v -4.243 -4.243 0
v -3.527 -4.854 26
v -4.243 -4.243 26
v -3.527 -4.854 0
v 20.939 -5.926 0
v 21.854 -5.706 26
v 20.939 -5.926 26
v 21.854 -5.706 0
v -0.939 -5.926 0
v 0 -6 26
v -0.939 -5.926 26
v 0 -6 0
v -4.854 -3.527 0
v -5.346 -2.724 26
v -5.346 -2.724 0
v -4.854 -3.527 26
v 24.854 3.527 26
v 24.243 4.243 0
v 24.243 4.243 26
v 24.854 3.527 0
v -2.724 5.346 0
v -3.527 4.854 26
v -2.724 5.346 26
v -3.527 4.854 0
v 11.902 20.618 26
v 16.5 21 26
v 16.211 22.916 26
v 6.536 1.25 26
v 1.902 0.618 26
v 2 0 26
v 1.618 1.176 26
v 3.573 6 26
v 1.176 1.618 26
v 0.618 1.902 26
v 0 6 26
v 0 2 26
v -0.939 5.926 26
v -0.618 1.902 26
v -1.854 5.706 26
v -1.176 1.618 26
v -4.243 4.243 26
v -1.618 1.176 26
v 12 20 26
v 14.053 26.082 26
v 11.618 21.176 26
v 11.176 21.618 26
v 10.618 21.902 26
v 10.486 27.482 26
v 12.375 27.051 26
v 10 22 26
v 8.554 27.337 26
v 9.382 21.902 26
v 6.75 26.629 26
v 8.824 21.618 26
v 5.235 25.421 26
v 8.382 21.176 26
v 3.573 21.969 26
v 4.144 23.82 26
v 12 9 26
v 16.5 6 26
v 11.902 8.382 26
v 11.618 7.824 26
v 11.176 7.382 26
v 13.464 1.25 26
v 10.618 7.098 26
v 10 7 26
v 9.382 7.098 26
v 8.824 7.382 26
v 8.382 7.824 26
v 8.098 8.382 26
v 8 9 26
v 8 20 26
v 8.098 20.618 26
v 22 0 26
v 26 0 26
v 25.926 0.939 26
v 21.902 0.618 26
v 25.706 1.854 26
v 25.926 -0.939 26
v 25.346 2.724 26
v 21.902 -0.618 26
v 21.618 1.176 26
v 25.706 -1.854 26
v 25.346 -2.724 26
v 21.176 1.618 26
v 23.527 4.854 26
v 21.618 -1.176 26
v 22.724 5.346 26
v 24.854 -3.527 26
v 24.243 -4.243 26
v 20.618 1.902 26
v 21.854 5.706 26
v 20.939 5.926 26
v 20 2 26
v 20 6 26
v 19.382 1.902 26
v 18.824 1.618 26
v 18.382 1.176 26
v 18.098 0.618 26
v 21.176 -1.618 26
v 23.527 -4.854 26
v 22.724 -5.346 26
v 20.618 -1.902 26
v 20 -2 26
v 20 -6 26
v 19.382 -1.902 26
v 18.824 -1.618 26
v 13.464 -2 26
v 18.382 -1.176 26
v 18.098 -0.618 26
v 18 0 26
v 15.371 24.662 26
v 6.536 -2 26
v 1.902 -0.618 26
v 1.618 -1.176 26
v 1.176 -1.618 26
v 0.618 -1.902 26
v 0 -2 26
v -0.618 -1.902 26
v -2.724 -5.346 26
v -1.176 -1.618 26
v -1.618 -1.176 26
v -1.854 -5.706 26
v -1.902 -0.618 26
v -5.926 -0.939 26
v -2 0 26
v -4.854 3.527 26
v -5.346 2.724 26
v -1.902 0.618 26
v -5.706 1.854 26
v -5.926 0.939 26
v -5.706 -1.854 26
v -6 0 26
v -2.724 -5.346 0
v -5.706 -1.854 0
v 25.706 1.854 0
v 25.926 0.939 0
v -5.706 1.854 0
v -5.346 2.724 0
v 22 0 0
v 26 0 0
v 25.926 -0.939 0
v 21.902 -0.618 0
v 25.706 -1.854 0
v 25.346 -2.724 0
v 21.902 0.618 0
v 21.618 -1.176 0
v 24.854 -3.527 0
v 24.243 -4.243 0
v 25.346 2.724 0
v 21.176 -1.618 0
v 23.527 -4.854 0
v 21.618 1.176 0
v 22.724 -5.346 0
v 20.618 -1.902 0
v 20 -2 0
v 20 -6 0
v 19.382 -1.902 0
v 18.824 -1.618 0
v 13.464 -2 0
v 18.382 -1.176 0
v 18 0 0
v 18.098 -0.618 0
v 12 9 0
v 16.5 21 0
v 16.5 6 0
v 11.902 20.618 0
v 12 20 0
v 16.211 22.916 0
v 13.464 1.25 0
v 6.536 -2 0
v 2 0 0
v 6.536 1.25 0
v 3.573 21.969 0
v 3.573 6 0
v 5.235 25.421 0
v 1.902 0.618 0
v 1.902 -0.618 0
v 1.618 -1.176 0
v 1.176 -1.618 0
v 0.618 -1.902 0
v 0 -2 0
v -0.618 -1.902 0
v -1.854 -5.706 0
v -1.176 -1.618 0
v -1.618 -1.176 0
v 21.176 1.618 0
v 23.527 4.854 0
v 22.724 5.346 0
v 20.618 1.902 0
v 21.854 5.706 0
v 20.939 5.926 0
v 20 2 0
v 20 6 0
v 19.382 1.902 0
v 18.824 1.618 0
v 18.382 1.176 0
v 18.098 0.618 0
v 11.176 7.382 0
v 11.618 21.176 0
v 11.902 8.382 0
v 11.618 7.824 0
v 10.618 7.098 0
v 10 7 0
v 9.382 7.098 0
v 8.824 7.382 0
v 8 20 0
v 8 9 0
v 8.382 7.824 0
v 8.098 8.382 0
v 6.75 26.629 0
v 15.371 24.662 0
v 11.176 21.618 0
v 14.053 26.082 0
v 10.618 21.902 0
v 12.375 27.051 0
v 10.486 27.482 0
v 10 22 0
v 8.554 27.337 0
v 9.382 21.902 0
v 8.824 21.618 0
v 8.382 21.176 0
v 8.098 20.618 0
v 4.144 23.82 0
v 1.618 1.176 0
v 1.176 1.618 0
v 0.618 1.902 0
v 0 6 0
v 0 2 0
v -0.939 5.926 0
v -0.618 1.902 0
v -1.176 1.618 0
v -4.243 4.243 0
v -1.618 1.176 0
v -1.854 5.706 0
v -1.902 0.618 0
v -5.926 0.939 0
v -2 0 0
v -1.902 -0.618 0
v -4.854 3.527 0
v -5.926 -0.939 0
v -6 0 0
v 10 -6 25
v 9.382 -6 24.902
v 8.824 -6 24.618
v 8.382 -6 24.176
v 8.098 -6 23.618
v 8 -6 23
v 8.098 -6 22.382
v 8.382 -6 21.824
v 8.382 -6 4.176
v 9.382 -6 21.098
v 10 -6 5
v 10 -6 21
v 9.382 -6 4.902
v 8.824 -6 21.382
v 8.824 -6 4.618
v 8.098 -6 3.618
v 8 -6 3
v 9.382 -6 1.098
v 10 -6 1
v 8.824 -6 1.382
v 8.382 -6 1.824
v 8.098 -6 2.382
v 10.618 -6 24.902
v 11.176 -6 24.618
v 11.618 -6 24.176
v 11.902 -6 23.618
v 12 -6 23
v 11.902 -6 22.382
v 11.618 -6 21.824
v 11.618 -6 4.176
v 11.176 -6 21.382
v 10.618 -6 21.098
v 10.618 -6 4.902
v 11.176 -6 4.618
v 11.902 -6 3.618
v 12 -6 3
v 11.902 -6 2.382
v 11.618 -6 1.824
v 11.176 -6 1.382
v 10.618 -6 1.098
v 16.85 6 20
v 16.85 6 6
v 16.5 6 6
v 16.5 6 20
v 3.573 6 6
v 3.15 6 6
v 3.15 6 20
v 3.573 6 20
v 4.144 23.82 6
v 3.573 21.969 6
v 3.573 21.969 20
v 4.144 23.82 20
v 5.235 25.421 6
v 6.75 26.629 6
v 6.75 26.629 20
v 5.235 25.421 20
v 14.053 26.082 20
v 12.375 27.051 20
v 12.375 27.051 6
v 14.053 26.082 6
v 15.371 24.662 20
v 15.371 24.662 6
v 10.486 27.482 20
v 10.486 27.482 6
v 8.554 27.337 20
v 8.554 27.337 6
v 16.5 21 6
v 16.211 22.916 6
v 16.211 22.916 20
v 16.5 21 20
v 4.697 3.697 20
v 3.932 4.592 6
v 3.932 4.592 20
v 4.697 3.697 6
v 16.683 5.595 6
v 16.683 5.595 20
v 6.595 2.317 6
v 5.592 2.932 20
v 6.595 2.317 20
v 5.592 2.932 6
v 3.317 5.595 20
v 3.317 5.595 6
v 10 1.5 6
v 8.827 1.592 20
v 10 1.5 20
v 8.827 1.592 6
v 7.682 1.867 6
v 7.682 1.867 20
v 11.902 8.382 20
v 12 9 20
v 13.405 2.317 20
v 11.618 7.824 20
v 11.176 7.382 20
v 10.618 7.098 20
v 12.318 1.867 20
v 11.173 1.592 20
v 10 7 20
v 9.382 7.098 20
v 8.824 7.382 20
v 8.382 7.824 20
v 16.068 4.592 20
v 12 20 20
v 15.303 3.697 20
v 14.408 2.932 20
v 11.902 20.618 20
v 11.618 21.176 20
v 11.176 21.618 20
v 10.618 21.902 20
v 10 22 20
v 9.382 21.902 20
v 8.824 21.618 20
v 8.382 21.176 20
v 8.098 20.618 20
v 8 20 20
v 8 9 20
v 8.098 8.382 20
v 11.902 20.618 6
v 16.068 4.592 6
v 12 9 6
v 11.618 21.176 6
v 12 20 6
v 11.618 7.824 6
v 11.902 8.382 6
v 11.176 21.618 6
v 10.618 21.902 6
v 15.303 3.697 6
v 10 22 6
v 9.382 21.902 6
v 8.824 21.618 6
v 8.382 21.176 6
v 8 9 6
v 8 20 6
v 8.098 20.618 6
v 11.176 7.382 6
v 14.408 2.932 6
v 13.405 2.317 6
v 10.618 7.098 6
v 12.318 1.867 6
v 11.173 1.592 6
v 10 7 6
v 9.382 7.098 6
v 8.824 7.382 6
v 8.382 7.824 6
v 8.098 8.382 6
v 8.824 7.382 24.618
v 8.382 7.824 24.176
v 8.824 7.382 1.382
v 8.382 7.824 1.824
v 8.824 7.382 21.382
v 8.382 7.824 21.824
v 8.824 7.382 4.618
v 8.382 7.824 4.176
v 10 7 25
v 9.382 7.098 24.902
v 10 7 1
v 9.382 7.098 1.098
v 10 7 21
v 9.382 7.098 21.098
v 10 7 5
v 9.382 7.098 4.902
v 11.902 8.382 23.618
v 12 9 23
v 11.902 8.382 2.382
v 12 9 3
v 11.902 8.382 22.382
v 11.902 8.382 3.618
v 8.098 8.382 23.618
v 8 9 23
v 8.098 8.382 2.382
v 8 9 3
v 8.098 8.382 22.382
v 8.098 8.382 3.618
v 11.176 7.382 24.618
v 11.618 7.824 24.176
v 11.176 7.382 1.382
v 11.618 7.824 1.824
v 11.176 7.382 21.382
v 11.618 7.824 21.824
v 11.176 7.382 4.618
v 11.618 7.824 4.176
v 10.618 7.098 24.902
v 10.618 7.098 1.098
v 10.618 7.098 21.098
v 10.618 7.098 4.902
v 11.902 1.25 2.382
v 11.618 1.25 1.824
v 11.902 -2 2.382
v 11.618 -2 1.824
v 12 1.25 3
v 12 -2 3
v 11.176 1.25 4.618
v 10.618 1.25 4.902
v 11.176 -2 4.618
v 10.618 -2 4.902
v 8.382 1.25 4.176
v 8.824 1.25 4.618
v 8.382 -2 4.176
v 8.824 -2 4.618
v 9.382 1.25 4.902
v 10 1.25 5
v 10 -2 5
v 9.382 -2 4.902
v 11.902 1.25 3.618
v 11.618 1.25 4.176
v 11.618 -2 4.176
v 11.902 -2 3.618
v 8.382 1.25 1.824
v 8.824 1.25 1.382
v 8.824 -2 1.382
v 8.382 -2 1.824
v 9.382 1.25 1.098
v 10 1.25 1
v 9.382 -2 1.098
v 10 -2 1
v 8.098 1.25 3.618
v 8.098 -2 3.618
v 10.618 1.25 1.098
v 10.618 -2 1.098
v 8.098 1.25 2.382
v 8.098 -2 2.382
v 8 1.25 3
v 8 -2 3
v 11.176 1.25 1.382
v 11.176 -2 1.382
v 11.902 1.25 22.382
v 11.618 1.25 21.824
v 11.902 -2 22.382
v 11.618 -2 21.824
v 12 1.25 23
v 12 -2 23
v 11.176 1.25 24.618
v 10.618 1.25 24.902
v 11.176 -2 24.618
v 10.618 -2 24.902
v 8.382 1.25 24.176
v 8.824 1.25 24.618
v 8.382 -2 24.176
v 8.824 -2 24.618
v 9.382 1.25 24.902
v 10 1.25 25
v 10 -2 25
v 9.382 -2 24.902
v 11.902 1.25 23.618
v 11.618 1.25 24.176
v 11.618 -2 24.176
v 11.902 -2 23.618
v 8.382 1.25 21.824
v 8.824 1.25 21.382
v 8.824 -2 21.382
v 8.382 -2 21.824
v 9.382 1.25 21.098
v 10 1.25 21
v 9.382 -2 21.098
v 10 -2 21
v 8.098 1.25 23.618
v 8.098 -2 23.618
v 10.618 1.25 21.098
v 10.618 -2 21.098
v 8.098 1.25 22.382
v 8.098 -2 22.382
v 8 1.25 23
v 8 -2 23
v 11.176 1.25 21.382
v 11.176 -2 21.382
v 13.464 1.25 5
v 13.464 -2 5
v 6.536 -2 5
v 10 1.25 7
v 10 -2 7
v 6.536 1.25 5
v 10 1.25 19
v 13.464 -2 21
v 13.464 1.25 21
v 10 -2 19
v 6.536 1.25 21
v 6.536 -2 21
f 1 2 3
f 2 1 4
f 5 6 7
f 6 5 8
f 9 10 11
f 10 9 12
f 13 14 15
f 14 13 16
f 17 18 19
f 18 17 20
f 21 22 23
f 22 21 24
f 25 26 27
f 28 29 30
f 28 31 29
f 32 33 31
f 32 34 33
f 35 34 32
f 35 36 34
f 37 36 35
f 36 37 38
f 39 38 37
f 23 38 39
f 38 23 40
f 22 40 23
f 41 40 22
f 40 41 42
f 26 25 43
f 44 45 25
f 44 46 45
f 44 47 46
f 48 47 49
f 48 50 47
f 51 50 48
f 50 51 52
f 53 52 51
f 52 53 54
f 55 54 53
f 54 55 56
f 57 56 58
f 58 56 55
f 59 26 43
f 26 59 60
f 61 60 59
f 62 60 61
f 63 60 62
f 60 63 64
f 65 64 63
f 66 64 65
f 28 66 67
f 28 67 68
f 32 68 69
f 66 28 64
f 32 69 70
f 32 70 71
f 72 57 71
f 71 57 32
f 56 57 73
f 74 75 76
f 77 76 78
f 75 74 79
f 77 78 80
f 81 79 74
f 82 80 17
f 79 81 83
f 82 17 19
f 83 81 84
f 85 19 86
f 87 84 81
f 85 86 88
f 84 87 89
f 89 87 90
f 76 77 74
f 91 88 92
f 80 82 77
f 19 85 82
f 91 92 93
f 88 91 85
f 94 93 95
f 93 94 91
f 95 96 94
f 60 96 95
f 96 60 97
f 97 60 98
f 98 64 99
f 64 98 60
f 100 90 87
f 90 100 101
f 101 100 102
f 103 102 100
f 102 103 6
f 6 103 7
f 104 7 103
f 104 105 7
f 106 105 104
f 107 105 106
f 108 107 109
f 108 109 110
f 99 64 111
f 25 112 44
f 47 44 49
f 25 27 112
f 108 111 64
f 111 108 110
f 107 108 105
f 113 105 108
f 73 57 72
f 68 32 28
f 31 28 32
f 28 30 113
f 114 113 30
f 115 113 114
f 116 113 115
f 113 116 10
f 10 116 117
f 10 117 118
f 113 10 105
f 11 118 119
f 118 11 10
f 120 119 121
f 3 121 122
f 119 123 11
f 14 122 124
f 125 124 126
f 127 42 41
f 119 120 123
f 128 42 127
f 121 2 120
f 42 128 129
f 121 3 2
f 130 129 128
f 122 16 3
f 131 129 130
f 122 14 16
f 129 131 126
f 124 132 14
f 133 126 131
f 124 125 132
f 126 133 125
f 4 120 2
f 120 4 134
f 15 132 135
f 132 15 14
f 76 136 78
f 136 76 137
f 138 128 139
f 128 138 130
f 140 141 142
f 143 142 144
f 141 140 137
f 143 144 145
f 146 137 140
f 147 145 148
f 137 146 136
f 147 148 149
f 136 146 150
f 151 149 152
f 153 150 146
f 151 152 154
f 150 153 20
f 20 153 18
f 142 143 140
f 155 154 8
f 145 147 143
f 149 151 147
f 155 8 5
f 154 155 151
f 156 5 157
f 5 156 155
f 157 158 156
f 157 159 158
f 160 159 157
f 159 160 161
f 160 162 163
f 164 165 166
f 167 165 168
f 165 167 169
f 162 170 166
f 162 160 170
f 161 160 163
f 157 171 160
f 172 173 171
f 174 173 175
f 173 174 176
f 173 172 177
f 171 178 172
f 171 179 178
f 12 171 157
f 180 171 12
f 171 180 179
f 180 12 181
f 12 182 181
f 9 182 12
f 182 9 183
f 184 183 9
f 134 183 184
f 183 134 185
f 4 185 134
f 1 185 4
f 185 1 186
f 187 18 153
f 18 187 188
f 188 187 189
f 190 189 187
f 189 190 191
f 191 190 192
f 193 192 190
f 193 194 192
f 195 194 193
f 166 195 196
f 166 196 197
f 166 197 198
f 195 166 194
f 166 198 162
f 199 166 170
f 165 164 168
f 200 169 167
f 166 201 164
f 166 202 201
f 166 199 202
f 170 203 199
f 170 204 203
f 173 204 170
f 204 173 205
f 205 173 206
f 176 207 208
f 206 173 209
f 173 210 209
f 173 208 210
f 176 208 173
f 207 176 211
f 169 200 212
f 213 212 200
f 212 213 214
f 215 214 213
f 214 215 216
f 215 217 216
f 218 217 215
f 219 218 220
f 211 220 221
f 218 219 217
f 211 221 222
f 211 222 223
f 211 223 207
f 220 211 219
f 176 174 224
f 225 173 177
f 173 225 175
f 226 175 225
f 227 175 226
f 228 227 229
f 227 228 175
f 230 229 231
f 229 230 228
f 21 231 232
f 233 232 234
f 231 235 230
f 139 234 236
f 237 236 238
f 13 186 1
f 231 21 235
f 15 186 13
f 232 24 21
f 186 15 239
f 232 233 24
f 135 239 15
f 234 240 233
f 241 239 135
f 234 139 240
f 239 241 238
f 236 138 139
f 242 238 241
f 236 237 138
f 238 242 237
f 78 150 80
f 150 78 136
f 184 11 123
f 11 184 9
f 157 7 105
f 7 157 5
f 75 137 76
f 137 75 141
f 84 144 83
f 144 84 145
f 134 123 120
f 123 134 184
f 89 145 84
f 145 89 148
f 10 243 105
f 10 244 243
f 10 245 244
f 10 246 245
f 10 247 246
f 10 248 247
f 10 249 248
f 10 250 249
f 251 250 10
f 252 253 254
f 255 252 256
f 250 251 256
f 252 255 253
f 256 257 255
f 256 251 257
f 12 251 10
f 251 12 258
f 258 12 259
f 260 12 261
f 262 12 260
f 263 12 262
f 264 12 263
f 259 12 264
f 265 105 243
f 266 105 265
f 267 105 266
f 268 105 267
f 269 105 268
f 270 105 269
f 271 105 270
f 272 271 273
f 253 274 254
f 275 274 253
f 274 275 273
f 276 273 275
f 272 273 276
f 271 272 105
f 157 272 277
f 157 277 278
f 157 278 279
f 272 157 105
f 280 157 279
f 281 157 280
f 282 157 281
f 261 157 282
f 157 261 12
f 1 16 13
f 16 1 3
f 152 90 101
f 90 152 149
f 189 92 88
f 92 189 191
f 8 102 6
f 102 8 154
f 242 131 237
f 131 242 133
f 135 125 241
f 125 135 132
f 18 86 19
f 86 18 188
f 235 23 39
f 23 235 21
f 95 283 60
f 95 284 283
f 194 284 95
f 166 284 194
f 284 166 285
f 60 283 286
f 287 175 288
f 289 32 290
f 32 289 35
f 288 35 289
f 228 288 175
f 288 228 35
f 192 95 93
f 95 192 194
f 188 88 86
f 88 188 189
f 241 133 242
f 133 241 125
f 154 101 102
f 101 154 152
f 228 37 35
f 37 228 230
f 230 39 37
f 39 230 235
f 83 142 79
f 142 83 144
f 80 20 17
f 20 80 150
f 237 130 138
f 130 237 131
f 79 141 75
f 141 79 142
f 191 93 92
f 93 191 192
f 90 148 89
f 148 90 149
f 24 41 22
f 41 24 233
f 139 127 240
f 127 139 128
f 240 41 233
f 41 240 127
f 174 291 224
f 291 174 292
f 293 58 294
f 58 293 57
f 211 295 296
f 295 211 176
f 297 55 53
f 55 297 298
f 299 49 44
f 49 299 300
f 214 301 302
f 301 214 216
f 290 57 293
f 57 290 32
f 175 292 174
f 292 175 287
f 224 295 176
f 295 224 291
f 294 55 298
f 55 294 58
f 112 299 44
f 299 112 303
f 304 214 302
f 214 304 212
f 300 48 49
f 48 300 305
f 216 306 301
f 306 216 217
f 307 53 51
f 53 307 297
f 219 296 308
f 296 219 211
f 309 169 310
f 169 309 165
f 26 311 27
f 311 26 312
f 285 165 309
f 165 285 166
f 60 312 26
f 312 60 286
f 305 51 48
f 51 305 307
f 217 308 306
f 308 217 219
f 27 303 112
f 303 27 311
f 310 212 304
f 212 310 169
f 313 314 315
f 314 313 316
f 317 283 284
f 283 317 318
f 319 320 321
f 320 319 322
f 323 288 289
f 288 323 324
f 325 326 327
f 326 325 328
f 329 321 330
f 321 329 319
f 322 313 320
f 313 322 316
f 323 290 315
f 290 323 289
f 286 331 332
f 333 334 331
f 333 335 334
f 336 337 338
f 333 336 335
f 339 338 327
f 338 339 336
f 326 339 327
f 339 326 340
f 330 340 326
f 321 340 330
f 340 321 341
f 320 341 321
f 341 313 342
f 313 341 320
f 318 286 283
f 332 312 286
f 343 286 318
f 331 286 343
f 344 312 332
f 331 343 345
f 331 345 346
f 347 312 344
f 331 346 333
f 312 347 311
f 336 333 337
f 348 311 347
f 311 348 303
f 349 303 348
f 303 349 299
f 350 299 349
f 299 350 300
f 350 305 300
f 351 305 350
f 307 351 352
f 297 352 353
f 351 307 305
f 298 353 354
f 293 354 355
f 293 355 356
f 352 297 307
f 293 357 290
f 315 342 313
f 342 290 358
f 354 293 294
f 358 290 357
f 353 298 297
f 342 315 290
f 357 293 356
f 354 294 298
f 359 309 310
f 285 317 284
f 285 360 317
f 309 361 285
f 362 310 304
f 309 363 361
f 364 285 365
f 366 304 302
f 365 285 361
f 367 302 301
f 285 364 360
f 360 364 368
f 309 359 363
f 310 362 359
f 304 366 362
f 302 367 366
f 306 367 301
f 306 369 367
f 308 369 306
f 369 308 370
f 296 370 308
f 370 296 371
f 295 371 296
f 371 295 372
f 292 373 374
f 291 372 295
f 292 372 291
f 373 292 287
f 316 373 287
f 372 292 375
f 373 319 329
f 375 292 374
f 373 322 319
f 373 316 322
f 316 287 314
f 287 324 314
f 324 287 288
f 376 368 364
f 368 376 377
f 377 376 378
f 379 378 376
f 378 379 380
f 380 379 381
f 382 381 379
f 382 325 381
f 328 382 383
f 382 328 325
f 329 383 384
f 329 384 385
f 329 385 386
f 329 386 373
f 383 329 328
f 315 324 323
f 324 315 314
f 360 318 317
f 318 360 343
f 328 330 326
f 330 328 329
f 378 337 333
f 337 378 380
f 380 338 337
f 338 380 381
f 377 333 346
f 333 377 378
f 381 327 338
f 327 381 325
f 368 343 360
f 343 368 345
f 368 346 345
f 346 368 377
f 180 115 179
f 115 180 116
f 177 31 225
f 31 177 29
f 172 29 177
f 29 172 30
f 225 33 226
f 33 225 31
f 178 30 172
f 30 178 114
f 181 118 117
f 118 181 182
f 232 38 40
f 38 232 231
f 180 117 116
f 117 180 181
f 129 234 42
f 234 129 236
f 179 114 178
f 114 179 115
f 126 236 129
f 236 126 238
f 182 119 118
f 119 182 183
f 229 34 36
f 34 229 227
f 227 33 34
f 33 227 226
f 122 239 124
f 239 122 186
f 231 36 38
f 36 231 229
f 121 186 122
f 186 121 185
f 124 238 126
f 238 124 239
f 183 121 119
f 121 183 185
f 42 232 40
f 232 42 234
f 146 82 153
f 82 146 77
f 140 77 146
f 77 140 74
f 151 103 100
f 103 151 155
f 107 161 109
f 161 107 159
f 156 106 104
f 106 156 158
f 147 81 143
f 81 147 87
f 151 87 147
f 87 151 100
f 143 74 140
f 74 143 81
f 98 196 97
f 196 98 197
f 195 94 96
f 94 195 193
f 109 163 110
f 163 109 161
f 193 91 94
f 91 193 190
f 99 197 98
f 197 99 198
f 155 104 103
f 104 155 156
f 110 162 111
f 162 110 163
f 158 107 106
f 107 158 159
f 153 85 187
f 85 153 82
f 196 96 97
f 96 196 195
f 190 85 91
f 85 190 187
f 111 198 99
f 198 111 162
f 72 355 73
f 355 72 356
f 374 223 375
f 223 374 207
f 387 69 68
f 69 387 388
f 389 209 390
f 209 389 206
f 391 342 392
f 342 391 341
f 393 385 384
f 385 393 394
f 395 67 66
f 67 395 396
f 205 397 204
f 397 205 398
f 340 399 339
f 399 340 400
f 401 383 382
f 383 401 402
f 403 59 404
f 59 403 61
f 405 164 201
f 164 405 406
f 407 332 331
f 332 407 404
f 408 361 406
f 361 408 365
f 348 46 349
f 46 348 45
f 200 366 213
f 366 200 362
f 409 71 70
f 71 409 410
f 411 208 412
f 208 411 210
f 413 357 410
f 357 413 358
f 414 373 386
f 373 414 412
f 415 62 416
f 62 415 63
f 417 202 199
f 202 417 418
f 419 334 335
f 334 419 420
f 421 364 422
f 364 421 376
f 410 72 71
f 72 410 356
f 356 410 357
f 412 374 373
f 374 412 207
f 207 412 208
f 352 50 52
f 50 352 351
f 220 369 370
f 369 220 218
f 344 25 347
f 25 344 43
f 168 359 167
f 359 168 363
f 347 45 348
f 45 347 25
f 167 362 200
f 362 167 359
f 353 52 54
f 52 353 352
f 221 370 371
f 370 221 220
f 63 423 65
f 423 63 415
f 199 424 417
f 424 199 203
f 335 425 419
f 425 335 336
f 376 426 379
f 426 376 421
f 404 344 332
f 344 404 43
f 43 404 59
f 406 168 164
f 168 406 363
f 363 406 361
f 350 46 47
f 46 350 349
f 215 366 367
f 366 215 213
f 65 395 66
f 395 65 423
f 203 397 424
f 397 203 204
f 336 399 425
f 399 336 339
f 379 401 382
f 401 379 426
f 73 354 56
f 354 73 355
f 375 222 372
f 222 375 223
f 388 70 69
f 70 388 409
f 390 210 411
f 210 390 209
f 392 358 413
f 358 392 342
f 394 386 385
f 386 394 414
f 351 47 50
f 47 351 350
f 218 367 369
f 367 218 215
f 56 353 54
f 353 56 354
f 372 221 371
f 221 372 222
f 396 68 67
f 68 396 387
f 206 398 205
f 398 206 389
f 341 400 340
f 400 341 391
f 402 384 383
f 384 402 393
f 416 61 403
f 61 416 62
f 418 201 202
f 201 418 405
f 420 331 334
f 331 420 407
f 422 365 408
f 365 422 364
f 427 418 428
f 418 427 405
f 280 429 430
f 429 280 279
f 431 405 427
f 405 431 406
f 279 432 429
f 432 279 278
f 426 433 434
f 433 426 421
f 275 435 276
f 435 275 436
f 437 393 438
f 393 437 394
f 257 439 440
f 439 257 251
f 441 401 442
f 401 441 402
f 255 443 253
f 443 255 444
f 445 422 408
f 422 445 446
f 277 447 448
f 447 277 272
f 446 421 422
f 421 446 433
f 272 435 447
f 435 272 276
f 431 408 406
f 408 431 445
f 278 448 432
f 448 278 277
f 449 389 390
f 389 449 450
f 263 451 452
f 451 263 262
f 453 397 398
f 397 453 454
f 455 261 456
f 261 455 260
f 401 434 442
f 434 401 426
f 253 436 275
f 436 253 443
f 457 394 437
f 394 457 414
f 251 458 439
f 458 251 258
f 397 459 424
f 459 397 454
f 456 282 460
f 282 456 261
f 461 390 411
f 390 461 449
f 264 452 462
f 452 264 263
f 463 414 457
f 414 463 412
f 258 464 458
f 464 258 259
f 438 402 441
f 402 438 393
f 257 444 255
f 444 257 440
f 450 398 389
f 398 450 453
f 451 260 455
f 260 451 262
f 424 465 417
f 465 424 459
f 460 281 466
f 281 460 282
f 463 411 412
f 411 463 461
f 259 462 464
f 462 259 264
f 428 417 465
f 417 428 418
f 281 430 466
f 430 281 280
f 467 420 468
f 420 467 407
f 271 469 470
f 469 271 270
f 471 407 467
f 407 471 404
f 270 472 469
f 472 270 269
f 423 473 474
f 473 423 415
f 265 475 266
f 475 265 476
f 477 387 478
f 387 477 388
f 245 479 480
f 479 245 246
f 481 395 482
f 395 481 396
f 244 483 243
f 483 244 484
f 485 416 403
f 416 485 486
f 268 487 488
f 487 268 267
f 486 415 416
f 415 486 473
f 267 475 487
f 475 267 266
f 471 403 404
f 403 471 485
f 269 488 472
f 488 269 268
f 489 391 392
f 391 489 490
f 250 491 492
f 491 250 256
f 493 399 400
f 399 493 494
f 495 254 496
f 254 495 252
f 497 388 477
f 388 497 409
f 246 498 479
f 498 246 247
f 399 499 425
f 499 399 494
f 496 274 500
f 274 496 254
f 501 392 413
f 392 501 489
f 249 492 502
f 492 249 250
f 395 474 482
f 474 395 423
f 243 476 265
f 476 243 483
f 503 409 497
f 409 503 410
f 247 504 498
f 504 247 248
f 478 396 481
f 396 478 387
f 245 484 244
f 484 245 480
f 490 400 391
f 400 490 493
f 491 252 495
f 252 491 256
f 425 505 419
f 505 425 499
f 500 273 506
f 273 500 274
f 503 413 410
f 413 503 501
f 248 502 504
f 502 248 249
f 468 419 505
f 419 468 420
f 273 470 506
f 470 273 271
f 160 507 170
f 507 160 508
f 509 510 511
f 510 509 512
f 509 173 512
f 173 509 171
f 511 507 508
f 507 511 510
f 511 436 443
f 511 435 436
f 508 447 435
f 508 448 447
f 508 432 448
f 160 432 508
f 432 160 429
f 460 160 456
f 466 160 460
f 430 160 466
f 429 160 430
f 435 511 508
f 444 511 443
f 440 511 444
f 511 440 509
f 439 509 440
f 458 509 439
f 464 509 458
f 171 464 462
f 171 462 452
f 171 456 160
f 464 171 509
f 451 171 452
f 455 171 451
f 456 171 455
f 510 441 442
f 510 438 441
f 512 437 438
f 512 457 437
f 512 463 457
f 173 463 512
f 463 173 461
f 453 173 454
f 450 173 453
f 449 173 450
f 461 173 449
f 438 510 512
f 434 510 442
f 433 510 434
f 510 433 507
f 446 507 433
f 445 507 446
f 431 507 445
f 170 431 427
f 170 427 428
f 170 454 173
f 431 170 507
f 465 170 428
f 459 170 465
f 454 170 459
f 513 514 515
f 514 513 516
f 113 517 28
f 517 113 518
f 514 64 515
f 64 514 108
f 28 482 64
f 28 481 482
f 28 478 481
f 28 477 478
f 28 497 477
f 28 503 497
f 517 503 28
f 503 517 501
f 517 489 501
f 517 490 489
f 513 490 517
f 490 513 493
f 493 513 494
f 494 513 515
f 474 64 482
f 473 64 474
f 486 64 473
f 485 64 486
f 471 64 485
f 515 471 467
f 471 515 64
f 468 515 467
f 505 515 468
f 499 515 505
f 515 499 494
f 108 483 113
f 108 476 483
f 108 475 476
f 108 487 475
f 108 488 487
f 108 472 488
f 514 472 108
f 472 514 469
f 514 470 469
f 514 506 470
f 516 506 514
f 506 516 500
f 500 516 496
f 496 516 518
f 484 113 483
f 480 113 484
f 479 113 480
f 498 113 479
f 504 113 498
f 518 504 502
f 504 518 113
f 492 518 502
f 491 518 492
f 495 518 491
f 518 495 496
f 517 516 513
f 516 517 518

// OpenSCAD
// file: utils.scad
// Author: Mihai Oltean, www.tcreate.org, mihai.oltean@gmail.com
// More details: jenny5.org
// Source: github.com/jenny5-robot
// MIT License
//--------------------------------------------------------------

module colt(radius, height)
{
	difference(){
		cube ([radius, radius, height]);
		cylinder	(h = height, r = radius, $fn = 30);
	}
}
/////////////////////////////////////////////////////////////////////////////////////////////////////////////////////////
module colt_sferic(radius)
{
	difference(){
		cube ([radius, radius, radius]);
		sphere(r = radius, $fn = 40);
	}
}
/////////////////////////////////////////////////////////////////////////////////////////////////////////////////////////
module coloana_sferica(height, radius)
{
		difference(){
			cube ([height, height, height]);
			cylinder(h= height, r = radius, $fn = 50);
		}
}
/////////////////////////////////////////////////////////////////////////////////////////////////////////////////////////
// file: radial_bearings.scad
// Author: Mihai Oltean, www.tcreate.org, mihai.oltean@gmail.com
// More details: jenny5.org
// Source: github.com/jenny5-robot
// MIT License
//--------------------------------------------------------------

include <params_radial_bearings.scad>
use <basic_components.scad>

////////////////////////////////////////////////////////////////////////////////////////////////////////////////////////
module radial_bearing(internal_radius, external_radius, height)
{
	union(){
		translate ([0, 0, 0.5]) color ("black") cylinder_empty(height  - 1, external_radius - 1, internal_radius + 1, 70);
		color ("Gainsboro") cylinder_empty(height, internal_radius + 1, internal_radius, 70);
		color ("Gainsboro") cylinder_empty(height, external_radius, external_radius - 1, 70);
	}
}
////////////////////////////////////////////////////////////////////////////////////////////////////////////////////////
module 624rs()
{
	radial_bearing(2, bearing_4_external_radius, bearing_4_height);
}
////////////////////////////////////////////////////////////////////////////////////////////////////////////////////////
module 628rs()
{
	radial_bearing(4, bearing_8_external_radius, bearing_8_height);
}
////////////////////////////////////////////////////////////////////////////////////////////////////////////////////////
module 625rs()
{
	radial_bearing(2.5, bearing_5_external_radius, bearing_5_height);
}
////////////////////////////////////////////////////////////////////////////////////////////////////////////////////////
module 626rs()
{
	radial_bearing(3, bearing_6_external_radius, bearing_6_height);
}
////////////////////////////////////////////////////////////////////////////////////////////////////////////////////////
module 6001rs()
{
	radial_bearing(rb_6001_internal_radius, rb_6001_external_radius, rb_6001_thick);
}
////////////////////////////////////////////////////////////////////////////////////////////////////////////////////////
module 6002rs()
{
	radial_bearing(rb_6002_internal_radius, rb_6002_external_radius, rb_6002_thick);
}
////////////////////////////////////////////////////////////////////////////////////////////////////////////////////////
module 608rs()
{
	radial_bearing(rb_608_internal_radius, rb_608_external_radius, rb_608_thick);
}
////////////////////////////////////////////////////////////////////////////////////////////////////////////////////////
module 698rs()
{
	radial_bearing(rb_698_internal_radius, rb_698_external_radius, rb_698_thick);
}
////////////////////////////////////////////////////////////////////////////////////////////////////////////////////////
6002rs();
// file: config.scad
// Author: Mihai Oltean, www.tcreate.org, mihai.oltean@gmail.com
// More details: jenny5.org
// Source: github.com/jenny5-robot
// MIT License
//--------------------------------------------------------------

aluminium_color = "Silver";
screw_color = "LightSlateGray";
frame_color = aluminium_color;
shaft_color = "Silver";
plastic_color = "LimeGreen";
pulley_color = "DarkSlateGray";
// file: params_radial_bearings.scad
// Author: Mihai Oltean, www.tcreate.org, mihai.oltean@gmail.com
// More details: jenny5.org
// Source: github.com/jenny5-robot
// MIT License
//--------------------------------------------------------------

bearing_4_external_radius = 6.5;
bearing_4_height = 5;

bearing_5_external_radius = 8;
bearing_5_internal_radius = 2.5;
bearing_5_thick = 5;
bearing_5_height = 5;

bearing_6_internal_radius = 3;
bearing_6_external_radius = 9.5;
bearing_6_thick = 6;
bearing_6_height = 6;

bearing_8_internal_radius = 4;
bearing_8_external_radius = 11;
bearing_8_height = 7;

bearing_10_internal_radius = 5;
bearing_10_external_radius = 13;
bearing_10_height = 8;

radial_bearing_4_external_radius = 6.5;
radial_bearing_4_height = 5;

radial_bearing_5_external_radius = 8;
radial_bearing_5_internal_radius = 2.5;
radial_bearing_5_thick = 5;
radial_bearing_5_height = 5;

radial_bearing_6_internal_radius = 3;
radial_bearing_6_external_radius = 9.5;
radial_bearing_6_thick = 6;
radial_bearing_6_height = 6;

radial_bearing_8_internal_radius = 4;
radial_bearing_8_external_radius = 11;
radial_bearing_8_height = 7;

radial_bearing_10_internal_radius = 5;
radial_bearing_10_external_radius = 13;
radial_bearing_10_height = 8;

rb_6002_internal_radius = 7.5;
rb_6002_external_radius = 16;
rb_6002_thick = 9;

rb_624_internal_radius = 2;
rb_624_external_radius = 6.5;
rb_624_thick = 5;

rb_625_internal_radius = 2.5;
rb_625_external_radius = 8;
rb_625_thick = 5;

rb_626_internal_radius = 3;
rb_626_external_radius = 9.5;
rb_626_thick = 6;

rb_608_internal_radius = 4;
rb_608_external_radius = 11;
rb_608_thick = 7;

rb_698_internal_radius = 4;
rb_698_external_radius = 9.5;
rb_698_thick = 6;

rb_688_internal_radius = 4;
rb_688_external_radius = 8;
rb_688_thick = 4;

rb_6001_internal_radius = 6;
rb_6001_external_radius = 14;
rb_6001_thick = 8;

rb_6201_internal_radius = 6;
rb_6201_external_radius = 16;
rb_6201_thick = 10;
// file: params_basic_components.scad
// Author: Mihai Oltean, www.tcreate.org, mihai.oltean@gmail.com
// More details: jenny5.org
// Source: github.com/jenny5-robot
// MIT License
//--------------------------------------------------------------

spring_length = 20;

smooth_rod_8_radius = 4;
smooth_rod_10_radius = 5;
smooth_rod_12_radius = 6;

tolerance = 0.1;
display_tolerance = 1;

overlap_tolerance = 0.01;

wall_thick_1 = 1;
wall_thick_2 = 2;
wall_thick_3 = 3;
wall_thick_4 = 4;
wall_thick_5 = 5;
wall_thick_5_5 = 5.5;
wall_thick_6 = 6;
wall_thick_7 = 7;
wall_thick_8 = 8;
wall_thick_9 = 9;
wall_thick_10 = 10;
wall_thick_12 = 10;

tolerance_z = [0, 0, tolerance];
tolerance_x = [tolerance, 0, 0];
tolerance_y = [0, tolerance, 0];

display_tolerance_z = [0, 0, display_tolerance];
display_tolerance_x = [display_tolerance, 0, 0];
display_tolerance_y = [0, display_tolerance, 0];

display_tolerance_xz = [display_tolerance, 0, display_tolerance];
display_tolerance_xy = [display_tolerance, display_tolerance, 0];
display_tolerance_yz = [0, display_tolerance, display_tolerance];

display_tolerance_xyz = [display_tolerance, display_tolerance, display_tolerance];
// file: params_screws_nuts_washers.scad
// Author: Mihai Oltean, www.tcreate.org, mihai.oltean@gmail.com
// More details: jenny5.org
// Source: github.com/jenny5-robot
// MIT License
//--------------------------------------------------------------


m2_screw_radius = 1;
m2_nut_radius = 2.2;
m2_nut_height = 1.6;
m2_nut_thick = m2_nut_height;

m3_screw_radius = 1.5;
m3_nut_radius = 3.1;
m3_nut_height = 2.3;
m3_nut_thick = m3_nut_height;
m3_autolock_nut_thick = 4.2;

m4_screw_radius = 2;
m4_nut_radius = 4;
m4_auto_lock_nut_height = 5;
m4_nut_height = 3.25;
m4_nut_thick = 3.25;

m5_screw_radius = 2.5;
m5_nut_radius = 4.6;
m5_nut_height = 4;

m6_screw_radius = 3;
m6_nut_radius = 5.65;
m6_nut_thick = 5;
m6_nut_slim_thick = 3;
m6_autolock_nut_thick = 6;
m6_long_nut_thick = 9;

m8_screw_head_height = 5.7;
m8_screw_radius = 3.9;
m8_nut_small_width = 12.8;
m8_nut_radius = 7.3;
m8_slim_nut_small_width = 12.4;
m8_nut_thick = 6.5;
m8_nut_height = m8_nut_thick;
m8_slim_nut_height = 5.5;
m8_screw_head_radius = 6.5;
m8_autolock_nut_thick = 8;

m10_screw_radius = 5;
m10_nut_thick = 8;
m10_nut_radius = 9.8;

M12_screw_radius = 6;
M12_nut_thick = 8;
M12_nut_radius = 11;
M12_long_long_nut_thick = 36;
M12_long_nut_thick = 36;
M12_autolock_nut_thick = 14;

m10_long_nut_radius = 9.71;
m10_long_nut_height = 29.8;

m10_long_thick_nut_radius = 7.41;
m10_long_thick_nut_height = 30.4;

m12_plastic_nut_radius = 10.45;
m12_plastic_nut_height = 23.3;

tr12_3_nut_radius = 11;
tr12_3_nut_height = 18.1;

washer_5 = 0.97;

washer_4_12_radius = 6;
washer_4_12_external_radius = 6;
washer_4_12_thick = 1;
washer_4_thick = 1;
washer_4_12_internal_radius = 2.15;

washer_4_9_external_radius = 4.5;
washer_4_9_internal_radius = 2.15;
washer_4_9_thick = 1;

washer_6_thick = 1.7;
washer_8_thick = 1.5;
washer_5_thick = 1;

washer_10_height = 2;
washer_10_thick = 2;

washer_12_thick = 2;

washer_5_15_external_radius = 7.5;
washer_5_15_thick = 1;
washer_5_thick = 1;
washer_5_15_internal_radius = 2.65;
// main file
// Author: Mihai Oltean, www.tcreate.org, mihai.oltean@gmail.com
// More details: jenny5.org
// Source: github.com/jenny5-robot
// MIT License
//--------------------------------------------------------------

include <params_screws_nuts_washers.scad>
include <params_basic_components.scad>
include <params_radial_bearings.scad>
include <config.scad>

use <screws_nuts_washers.scad>
use <radial_bearings.scad>


//---------------------------------------------------------------------------
module belt_tensioner_cover(length, width)
{
    wall_thick = 3;
    difference(){
        color(plastic_color) cube([length, width, wall_thick]);
        translate ([washer_4_12_radius, width / 2, 0] - display_tolerance_z) cylinder(h = wall_thick + 2 * display_tolerance, r = m4_screw_radius, $fn = 30);
        translate ([length - washer_4_12_radius, width / 2, 0] - display_tolerance_z) cylinder(h = wall_thick + 2 * display_tolerance, r = m4_screw_radius, $fn = 30);
    }
}
//---------------------------------------------------------------------------
module belt_tensioner_base(length)
{
    wall_thick = 3;
    bone_thick = 10;

    h = 13 - wall_thick;
    
    thick = 12;
    width = bone_thick + 2 * wall_thick;
    bearing_cover_length = 4 * washer_4_12_radius + width;
    
    difference(){
        union(){
            color(plastic_color) cube([length, width, thick]);
            translate ([length - 0.01, -bearing_cover_length / 2 + width / 2, 0]) rotate ([90, 0, 90]) belt_tensioner_cover(bearing_cover_length, thick, wall_thick);
        }
        // bone hole
        translate([wall_thick + m4_nut_thick, wall_thick - 0.2, 0] - display_tolerance_z) cube([bone_thick + 2, bone_thick + 2 * 0.2, thick] + 2 * display_tolerance_z);
        // m4 screw hole
        translate([0, width / 2, thick / 2] - display_tolerance_x) rotate([0, 90, 0]) cylinder (h = 10, r = m4_screw_radius, $fn = 30);
        // m4 nut hole
        translate([wall_thick, width / 2, thick / 2]) rotate([0, 90, 0]) cylinder (h = 10, r = m4_nut_radius, $fn = 6);
    }
}
//---------------------------------------------------------------------------
module belt_tensioner_housing(h)
{
    difference(){
        color (plastic_color) cube([2 * wall_thick_3 + 2 * washer_5_15_external_radius, wall_thick_3 + 4 * washer_4_12_radius, h]);
        // remove middle
        translate ([wall_thick_3, wall_thick_3, wall_thick_3]) cube([2 * washer_5_15_external_radius, 4 * washer_4_12_radius, h] + display_tolerance_y);
        // remove half
        translate ([0, wall_thick_3 + 4 * washer_4_12_radius, wall_thick_3] - display_tolerance_x) rotate([atan((wall_thick_3 + 4 * washer_4_12_radius)/ h), 0, 0]) cube([2 * wall_thick_3 + 2 * washer_5_15_external_radius, wall_thick_3 + 4 * washer_4_12_radius, sqrt(h*h + (wall_thick_3 + 4 * washer_4_12_radius) * (wall_thick_3 + 4 * washer_4_12_radius))] + 2 * display_tolerance_x);
        // base screw holes
        translate ([wall_thick_3 + washer_5_15_external_radius, wall_thick_3 + washer_4_12_radius, 0] - display_tolerance_z) cylinder (h = wall_thick_3 + 2 * display_tolerance, r = m4_screw_radius, $fn = 10); 

        translate ([wall_thick_3 + washer_5_15_external_radius, wall_thick_3 + 3 * washer_4_12_radius, 0] - display_tolerance_z) cylinder (h = wall_thick_3 + 2 * display_tolerance, r = m4_screw_radius, $fn = 10); 
        
        //bearing screw hole
hull(){
        translate ([wall_thick_3 + washer_5_15_external_radius, 0, wall_thick_3 + washer_5_15_external_radius] - display_tolerance_y) rotate ([-90, 0, 0]) cylinder (h = wall_thick_3 + 2 * display_tolerance, r = m4_screw_radius, $fn = 10);
        translate ([wall_thick_3 + washer_5_15_external_radius, 0, h - washer_5_15_external_radius] - display_tolerance_y) rotate ([-90, 0, 0]) cylinder (h = wall_thick_3 + 2 * display_tolerance, r = m4_screw_radius, $fn = 10);
}
    }
}
//---------------------------------------------------------------------------
module belt_tensioner_slider()
{
    M4x25_hexa();
    translate ([0, 0, m4_nut_thick]) M4x9_washer();
    translate ([0, 0, m4_nut_thick + 1]) washer_4_15();
    translate ([0, 0, m4_nut_thick + 1 + 1 + wall_thick_3]) washer_4_15();
    translate ([0, 0, m4_nut_thick + 1 + 1 + 1 + wall_thick_3]) washer_4_9();

    translate ([0, 0, m4_nut_thick + 1 + wall_thick_3 + 1 + 2]) 624rs();
    translate ([0, 0, m4_nut_thick + 1 + 4 + rb_624_thick + 2]) 624rs();
    translate ([0, 0, m4_nut_thick + 1 + 3 + 2 * rb_624_thick + wall_thick_3]) washer_4_9();
    translate ([0, 0, m4_nut_thick + 1 + 2 * rb_624_thick + 4 + wall_thick_3]) M4_autolock_nut();
}
//---------------------------------------------------------------------------
module belt_tensioner_prism(h, dist_to_bearings)
{
    
    belt_tensioner_housing(h);

// screw
    translate ([wall_thick_3 + washer_5_15_external_radius, m4_nut_thick + 2 + 3, wall_thick_3 + washer_5_15_external_radius + dist_to_bearings]) rotate ([90, 0, 0]) {
        belt_tensioner_slider();
    }
}
//---------------------------------------------------------------------------
module belt_tensioner_with_branch(h)
{
    belt_tensioner_base(h);

    // right side bearings
    translate ([h - 3, -washer_4_12_radius, washer_4_12_radius]) rotate ([0, 90, 0]) M4x25_hexa();
    translate ([h + 3, -washer_4_12_radius, washer_4_12_radius]) rotate ([0, 90, 0]) washer_4_9();
    translate ([h + 3 + 1, -washer_4_12_radius, washer_4_12_radius]) rotate ([0, 90, 0]) 624rs();
    translate ([h + 3 + 1 + rb_624_thick, -washer_4_12_radius, washer_4_12_radius]) rotate ([0, 90, 0]) 624rs();
    translate ([h + 3 + 1 + 2 * rb_624_thick, -washer_4_12_radius, washer_4_12_radius]) rotate ([0, 90, 0]) washer_4_9();
    translate ([h + 3 + 1 + 2 * rb_624_thick + 1 + wall_thick_3, -washer_4_12_radius, washer_4_12_radius]) rotate ([0, 90, 0]) washer_4_9();
    translate ([h + 3 + 1 + 2 * rb_624_thick + 1 + wall_thick_3 + 1, -washer_4_12_radius, washer_4_12_radius]) rotate ([0, 90, 0]) M4_autolock_nut();

    thick = 12;
    bone_thick = 10;
    width = bone_thick + 2 * wall_thick_3;

    // left side bearings
    translate ([h - 3, width + washer_4_12_radius, washer_4_12_radius]) rotate ([0, 90, 0]) M4x25_hexa();
    translate ([h + 3, width + washer_4_12_radius, washer_4_12_radius]) rotate ([0, 90, 0]) washer_4_9();
    translate ([h + 3 + 1, width + washer_4_12_radius, washer_4_12_radius]) rotate ([0, 90, 0]) 624rs();
    translate ([h + 3 + 1 + rb_624_thick, width + washer_4_12_radius, washer_4_12_radius]) rotate ([0, 90, 0]) 624rs();
    translate ([h + 3 + 1 + 2 * rb_624_thick, width + washer_4_12_radius, washer_4_12_radius]) rotate ([0, 90, 0]) washer_4_9();
    translate ([h + 3 + 1 + 2 * rb_624_thick + 1 + wall_thick_3, width + washer_4_12_radius, washer_4_12_radius]) rotate ([0, 90, 0]) washer_4_9();
    translate ([h + 3 + 1 + 2 * rb_624_thick + 1 + wall_thick_3 + 1, width + washer_4_12_radius, washer_4_12_radius]) rotate ([0, 90, 0]) M4_autolock_nut();

// cover
    bearing_cover_length = 4 * washer_4_12_radius + width;
    translate ([h + 3 + 1 + 2 * rb_624_thick + 1, -bearing_cover_length / 2 + width / 2, 0]) rotate ([90, 0, 90]) belt_tensioner_cover(bearing_cover_length, thick);

    
}
//---------------------------------------------------------------------------
module belt_tensioner_external()
{
    wing_thick = 6;
    pusher_length = 20;
    
    size = [20, 12, 2 * wing_thick + 2 * rb_624_thick + 2 * 2];
    difference(){
        union(){
            hull(){
                cylinder(h = size[2], r = 6, $fn = 40);
                translate([size[0], 0, 0]) cylinder(h = size[2], r = 6, $fn = 40);
            }
            
            hull(){
                translate([size[0] / 2, 1, 0]) cylinder(h = size[2], r = rb_624_external_radius);
                translate([size[0] / 2, pusher_length + 1, 0]) cylinder(h = size[2], r = rb_624_external_radius);
            }
        }
        
        // remove middle part
        hull(){
          translate([size[0] / 2, 6 + 3, wing_thick]) cylinder(h = size[2] - 2 * wing_thick, r = rb_624_external_radius + 1, $fn = 40);
          translate([size[0] / 2, pusher_length + 1 + 3, wing_thick]) cylinder(h = size[2] - 2 * wing_thick, r = rb_624_external_radius + 1, $fn = 40);
        }
        
        // fixer screw holes
        translate ( - display_tolerance_z) cylinder(h = size[2] + 2 * display_tolerance, r = 2, $fn = 20);
        translate([size[0], 0, 0] - display_tolerance_z) cylinder(h = size[2] + 2 * display_tolerance, r = 2, $fn = 20);
        
        // shaft hole
        hull(){
            translate([size[0] / 2, 6 + 3, 0] - display_tolerance_z) cylinder(h = size[2] + 2 * display_tolerance, r = 2, $fn = 20);
            translate([size[0] / 2, pusher_length, 0] - display_tolerance_z) cylinder(h = size[2] + 2 * display_tolerance, r = 2, $fn = 20);
        }
        
        // pusher screw 1
        translate ([size[0] / 2, -7, wing_thick / 2]) rotate ([-90, 0, 0]) cylinder (h = 20, r = m4_screw_radius, $fn = 20);
        // pusher screw 2
        translate ([size[0] / 2, -7, size[2] - wing_thick / 2]) rotate ([-90, 0, 0]) cylinder (h = 20, r = m4_screw_radius, $fn = 20);

        // pusher nut 1
        hull(){
            translate ([size[0] / 2, -2, wing_thick / 2]) rotate ([-90, 30, 0]) cylinder (h = m4_nut_thick, r = m4_nut_radius, $fn = 6);
            translate ([size[0] / 2, -2, 0]) rotate ([-90, 30, 0]) cylinder (h = m4_nut_thick, r = m4_nut_radius, $fn = 6);
        }
        // pusher nut 2
        hull(){
            translate ([size[0] / 2, -2, size[2] - wing_thick / 2]) rotate ([-90, 30, 0]) cylinder (h = m4_nut_thick, r = m4_nut_radius, $fn = 6);
            translate ([size[0] / 2, -2, size[2]]) rotate ([-90, 30, 0]) cylinder (h = m4_nut_thick, r = m4_nut_radius, $fn = 6);
        }
    }
}
//---------------------------------------------------------------------------

belt_tensioner_external();

//belt_tensioner_with_branch(31);

//belt_tensioner_housing(20);

//belt_tensioner_prism(30, 10);

//belt_tensioner_base(31);

//belt_tensioner_cover(40, 12);

//belt_tensioner_slider();
